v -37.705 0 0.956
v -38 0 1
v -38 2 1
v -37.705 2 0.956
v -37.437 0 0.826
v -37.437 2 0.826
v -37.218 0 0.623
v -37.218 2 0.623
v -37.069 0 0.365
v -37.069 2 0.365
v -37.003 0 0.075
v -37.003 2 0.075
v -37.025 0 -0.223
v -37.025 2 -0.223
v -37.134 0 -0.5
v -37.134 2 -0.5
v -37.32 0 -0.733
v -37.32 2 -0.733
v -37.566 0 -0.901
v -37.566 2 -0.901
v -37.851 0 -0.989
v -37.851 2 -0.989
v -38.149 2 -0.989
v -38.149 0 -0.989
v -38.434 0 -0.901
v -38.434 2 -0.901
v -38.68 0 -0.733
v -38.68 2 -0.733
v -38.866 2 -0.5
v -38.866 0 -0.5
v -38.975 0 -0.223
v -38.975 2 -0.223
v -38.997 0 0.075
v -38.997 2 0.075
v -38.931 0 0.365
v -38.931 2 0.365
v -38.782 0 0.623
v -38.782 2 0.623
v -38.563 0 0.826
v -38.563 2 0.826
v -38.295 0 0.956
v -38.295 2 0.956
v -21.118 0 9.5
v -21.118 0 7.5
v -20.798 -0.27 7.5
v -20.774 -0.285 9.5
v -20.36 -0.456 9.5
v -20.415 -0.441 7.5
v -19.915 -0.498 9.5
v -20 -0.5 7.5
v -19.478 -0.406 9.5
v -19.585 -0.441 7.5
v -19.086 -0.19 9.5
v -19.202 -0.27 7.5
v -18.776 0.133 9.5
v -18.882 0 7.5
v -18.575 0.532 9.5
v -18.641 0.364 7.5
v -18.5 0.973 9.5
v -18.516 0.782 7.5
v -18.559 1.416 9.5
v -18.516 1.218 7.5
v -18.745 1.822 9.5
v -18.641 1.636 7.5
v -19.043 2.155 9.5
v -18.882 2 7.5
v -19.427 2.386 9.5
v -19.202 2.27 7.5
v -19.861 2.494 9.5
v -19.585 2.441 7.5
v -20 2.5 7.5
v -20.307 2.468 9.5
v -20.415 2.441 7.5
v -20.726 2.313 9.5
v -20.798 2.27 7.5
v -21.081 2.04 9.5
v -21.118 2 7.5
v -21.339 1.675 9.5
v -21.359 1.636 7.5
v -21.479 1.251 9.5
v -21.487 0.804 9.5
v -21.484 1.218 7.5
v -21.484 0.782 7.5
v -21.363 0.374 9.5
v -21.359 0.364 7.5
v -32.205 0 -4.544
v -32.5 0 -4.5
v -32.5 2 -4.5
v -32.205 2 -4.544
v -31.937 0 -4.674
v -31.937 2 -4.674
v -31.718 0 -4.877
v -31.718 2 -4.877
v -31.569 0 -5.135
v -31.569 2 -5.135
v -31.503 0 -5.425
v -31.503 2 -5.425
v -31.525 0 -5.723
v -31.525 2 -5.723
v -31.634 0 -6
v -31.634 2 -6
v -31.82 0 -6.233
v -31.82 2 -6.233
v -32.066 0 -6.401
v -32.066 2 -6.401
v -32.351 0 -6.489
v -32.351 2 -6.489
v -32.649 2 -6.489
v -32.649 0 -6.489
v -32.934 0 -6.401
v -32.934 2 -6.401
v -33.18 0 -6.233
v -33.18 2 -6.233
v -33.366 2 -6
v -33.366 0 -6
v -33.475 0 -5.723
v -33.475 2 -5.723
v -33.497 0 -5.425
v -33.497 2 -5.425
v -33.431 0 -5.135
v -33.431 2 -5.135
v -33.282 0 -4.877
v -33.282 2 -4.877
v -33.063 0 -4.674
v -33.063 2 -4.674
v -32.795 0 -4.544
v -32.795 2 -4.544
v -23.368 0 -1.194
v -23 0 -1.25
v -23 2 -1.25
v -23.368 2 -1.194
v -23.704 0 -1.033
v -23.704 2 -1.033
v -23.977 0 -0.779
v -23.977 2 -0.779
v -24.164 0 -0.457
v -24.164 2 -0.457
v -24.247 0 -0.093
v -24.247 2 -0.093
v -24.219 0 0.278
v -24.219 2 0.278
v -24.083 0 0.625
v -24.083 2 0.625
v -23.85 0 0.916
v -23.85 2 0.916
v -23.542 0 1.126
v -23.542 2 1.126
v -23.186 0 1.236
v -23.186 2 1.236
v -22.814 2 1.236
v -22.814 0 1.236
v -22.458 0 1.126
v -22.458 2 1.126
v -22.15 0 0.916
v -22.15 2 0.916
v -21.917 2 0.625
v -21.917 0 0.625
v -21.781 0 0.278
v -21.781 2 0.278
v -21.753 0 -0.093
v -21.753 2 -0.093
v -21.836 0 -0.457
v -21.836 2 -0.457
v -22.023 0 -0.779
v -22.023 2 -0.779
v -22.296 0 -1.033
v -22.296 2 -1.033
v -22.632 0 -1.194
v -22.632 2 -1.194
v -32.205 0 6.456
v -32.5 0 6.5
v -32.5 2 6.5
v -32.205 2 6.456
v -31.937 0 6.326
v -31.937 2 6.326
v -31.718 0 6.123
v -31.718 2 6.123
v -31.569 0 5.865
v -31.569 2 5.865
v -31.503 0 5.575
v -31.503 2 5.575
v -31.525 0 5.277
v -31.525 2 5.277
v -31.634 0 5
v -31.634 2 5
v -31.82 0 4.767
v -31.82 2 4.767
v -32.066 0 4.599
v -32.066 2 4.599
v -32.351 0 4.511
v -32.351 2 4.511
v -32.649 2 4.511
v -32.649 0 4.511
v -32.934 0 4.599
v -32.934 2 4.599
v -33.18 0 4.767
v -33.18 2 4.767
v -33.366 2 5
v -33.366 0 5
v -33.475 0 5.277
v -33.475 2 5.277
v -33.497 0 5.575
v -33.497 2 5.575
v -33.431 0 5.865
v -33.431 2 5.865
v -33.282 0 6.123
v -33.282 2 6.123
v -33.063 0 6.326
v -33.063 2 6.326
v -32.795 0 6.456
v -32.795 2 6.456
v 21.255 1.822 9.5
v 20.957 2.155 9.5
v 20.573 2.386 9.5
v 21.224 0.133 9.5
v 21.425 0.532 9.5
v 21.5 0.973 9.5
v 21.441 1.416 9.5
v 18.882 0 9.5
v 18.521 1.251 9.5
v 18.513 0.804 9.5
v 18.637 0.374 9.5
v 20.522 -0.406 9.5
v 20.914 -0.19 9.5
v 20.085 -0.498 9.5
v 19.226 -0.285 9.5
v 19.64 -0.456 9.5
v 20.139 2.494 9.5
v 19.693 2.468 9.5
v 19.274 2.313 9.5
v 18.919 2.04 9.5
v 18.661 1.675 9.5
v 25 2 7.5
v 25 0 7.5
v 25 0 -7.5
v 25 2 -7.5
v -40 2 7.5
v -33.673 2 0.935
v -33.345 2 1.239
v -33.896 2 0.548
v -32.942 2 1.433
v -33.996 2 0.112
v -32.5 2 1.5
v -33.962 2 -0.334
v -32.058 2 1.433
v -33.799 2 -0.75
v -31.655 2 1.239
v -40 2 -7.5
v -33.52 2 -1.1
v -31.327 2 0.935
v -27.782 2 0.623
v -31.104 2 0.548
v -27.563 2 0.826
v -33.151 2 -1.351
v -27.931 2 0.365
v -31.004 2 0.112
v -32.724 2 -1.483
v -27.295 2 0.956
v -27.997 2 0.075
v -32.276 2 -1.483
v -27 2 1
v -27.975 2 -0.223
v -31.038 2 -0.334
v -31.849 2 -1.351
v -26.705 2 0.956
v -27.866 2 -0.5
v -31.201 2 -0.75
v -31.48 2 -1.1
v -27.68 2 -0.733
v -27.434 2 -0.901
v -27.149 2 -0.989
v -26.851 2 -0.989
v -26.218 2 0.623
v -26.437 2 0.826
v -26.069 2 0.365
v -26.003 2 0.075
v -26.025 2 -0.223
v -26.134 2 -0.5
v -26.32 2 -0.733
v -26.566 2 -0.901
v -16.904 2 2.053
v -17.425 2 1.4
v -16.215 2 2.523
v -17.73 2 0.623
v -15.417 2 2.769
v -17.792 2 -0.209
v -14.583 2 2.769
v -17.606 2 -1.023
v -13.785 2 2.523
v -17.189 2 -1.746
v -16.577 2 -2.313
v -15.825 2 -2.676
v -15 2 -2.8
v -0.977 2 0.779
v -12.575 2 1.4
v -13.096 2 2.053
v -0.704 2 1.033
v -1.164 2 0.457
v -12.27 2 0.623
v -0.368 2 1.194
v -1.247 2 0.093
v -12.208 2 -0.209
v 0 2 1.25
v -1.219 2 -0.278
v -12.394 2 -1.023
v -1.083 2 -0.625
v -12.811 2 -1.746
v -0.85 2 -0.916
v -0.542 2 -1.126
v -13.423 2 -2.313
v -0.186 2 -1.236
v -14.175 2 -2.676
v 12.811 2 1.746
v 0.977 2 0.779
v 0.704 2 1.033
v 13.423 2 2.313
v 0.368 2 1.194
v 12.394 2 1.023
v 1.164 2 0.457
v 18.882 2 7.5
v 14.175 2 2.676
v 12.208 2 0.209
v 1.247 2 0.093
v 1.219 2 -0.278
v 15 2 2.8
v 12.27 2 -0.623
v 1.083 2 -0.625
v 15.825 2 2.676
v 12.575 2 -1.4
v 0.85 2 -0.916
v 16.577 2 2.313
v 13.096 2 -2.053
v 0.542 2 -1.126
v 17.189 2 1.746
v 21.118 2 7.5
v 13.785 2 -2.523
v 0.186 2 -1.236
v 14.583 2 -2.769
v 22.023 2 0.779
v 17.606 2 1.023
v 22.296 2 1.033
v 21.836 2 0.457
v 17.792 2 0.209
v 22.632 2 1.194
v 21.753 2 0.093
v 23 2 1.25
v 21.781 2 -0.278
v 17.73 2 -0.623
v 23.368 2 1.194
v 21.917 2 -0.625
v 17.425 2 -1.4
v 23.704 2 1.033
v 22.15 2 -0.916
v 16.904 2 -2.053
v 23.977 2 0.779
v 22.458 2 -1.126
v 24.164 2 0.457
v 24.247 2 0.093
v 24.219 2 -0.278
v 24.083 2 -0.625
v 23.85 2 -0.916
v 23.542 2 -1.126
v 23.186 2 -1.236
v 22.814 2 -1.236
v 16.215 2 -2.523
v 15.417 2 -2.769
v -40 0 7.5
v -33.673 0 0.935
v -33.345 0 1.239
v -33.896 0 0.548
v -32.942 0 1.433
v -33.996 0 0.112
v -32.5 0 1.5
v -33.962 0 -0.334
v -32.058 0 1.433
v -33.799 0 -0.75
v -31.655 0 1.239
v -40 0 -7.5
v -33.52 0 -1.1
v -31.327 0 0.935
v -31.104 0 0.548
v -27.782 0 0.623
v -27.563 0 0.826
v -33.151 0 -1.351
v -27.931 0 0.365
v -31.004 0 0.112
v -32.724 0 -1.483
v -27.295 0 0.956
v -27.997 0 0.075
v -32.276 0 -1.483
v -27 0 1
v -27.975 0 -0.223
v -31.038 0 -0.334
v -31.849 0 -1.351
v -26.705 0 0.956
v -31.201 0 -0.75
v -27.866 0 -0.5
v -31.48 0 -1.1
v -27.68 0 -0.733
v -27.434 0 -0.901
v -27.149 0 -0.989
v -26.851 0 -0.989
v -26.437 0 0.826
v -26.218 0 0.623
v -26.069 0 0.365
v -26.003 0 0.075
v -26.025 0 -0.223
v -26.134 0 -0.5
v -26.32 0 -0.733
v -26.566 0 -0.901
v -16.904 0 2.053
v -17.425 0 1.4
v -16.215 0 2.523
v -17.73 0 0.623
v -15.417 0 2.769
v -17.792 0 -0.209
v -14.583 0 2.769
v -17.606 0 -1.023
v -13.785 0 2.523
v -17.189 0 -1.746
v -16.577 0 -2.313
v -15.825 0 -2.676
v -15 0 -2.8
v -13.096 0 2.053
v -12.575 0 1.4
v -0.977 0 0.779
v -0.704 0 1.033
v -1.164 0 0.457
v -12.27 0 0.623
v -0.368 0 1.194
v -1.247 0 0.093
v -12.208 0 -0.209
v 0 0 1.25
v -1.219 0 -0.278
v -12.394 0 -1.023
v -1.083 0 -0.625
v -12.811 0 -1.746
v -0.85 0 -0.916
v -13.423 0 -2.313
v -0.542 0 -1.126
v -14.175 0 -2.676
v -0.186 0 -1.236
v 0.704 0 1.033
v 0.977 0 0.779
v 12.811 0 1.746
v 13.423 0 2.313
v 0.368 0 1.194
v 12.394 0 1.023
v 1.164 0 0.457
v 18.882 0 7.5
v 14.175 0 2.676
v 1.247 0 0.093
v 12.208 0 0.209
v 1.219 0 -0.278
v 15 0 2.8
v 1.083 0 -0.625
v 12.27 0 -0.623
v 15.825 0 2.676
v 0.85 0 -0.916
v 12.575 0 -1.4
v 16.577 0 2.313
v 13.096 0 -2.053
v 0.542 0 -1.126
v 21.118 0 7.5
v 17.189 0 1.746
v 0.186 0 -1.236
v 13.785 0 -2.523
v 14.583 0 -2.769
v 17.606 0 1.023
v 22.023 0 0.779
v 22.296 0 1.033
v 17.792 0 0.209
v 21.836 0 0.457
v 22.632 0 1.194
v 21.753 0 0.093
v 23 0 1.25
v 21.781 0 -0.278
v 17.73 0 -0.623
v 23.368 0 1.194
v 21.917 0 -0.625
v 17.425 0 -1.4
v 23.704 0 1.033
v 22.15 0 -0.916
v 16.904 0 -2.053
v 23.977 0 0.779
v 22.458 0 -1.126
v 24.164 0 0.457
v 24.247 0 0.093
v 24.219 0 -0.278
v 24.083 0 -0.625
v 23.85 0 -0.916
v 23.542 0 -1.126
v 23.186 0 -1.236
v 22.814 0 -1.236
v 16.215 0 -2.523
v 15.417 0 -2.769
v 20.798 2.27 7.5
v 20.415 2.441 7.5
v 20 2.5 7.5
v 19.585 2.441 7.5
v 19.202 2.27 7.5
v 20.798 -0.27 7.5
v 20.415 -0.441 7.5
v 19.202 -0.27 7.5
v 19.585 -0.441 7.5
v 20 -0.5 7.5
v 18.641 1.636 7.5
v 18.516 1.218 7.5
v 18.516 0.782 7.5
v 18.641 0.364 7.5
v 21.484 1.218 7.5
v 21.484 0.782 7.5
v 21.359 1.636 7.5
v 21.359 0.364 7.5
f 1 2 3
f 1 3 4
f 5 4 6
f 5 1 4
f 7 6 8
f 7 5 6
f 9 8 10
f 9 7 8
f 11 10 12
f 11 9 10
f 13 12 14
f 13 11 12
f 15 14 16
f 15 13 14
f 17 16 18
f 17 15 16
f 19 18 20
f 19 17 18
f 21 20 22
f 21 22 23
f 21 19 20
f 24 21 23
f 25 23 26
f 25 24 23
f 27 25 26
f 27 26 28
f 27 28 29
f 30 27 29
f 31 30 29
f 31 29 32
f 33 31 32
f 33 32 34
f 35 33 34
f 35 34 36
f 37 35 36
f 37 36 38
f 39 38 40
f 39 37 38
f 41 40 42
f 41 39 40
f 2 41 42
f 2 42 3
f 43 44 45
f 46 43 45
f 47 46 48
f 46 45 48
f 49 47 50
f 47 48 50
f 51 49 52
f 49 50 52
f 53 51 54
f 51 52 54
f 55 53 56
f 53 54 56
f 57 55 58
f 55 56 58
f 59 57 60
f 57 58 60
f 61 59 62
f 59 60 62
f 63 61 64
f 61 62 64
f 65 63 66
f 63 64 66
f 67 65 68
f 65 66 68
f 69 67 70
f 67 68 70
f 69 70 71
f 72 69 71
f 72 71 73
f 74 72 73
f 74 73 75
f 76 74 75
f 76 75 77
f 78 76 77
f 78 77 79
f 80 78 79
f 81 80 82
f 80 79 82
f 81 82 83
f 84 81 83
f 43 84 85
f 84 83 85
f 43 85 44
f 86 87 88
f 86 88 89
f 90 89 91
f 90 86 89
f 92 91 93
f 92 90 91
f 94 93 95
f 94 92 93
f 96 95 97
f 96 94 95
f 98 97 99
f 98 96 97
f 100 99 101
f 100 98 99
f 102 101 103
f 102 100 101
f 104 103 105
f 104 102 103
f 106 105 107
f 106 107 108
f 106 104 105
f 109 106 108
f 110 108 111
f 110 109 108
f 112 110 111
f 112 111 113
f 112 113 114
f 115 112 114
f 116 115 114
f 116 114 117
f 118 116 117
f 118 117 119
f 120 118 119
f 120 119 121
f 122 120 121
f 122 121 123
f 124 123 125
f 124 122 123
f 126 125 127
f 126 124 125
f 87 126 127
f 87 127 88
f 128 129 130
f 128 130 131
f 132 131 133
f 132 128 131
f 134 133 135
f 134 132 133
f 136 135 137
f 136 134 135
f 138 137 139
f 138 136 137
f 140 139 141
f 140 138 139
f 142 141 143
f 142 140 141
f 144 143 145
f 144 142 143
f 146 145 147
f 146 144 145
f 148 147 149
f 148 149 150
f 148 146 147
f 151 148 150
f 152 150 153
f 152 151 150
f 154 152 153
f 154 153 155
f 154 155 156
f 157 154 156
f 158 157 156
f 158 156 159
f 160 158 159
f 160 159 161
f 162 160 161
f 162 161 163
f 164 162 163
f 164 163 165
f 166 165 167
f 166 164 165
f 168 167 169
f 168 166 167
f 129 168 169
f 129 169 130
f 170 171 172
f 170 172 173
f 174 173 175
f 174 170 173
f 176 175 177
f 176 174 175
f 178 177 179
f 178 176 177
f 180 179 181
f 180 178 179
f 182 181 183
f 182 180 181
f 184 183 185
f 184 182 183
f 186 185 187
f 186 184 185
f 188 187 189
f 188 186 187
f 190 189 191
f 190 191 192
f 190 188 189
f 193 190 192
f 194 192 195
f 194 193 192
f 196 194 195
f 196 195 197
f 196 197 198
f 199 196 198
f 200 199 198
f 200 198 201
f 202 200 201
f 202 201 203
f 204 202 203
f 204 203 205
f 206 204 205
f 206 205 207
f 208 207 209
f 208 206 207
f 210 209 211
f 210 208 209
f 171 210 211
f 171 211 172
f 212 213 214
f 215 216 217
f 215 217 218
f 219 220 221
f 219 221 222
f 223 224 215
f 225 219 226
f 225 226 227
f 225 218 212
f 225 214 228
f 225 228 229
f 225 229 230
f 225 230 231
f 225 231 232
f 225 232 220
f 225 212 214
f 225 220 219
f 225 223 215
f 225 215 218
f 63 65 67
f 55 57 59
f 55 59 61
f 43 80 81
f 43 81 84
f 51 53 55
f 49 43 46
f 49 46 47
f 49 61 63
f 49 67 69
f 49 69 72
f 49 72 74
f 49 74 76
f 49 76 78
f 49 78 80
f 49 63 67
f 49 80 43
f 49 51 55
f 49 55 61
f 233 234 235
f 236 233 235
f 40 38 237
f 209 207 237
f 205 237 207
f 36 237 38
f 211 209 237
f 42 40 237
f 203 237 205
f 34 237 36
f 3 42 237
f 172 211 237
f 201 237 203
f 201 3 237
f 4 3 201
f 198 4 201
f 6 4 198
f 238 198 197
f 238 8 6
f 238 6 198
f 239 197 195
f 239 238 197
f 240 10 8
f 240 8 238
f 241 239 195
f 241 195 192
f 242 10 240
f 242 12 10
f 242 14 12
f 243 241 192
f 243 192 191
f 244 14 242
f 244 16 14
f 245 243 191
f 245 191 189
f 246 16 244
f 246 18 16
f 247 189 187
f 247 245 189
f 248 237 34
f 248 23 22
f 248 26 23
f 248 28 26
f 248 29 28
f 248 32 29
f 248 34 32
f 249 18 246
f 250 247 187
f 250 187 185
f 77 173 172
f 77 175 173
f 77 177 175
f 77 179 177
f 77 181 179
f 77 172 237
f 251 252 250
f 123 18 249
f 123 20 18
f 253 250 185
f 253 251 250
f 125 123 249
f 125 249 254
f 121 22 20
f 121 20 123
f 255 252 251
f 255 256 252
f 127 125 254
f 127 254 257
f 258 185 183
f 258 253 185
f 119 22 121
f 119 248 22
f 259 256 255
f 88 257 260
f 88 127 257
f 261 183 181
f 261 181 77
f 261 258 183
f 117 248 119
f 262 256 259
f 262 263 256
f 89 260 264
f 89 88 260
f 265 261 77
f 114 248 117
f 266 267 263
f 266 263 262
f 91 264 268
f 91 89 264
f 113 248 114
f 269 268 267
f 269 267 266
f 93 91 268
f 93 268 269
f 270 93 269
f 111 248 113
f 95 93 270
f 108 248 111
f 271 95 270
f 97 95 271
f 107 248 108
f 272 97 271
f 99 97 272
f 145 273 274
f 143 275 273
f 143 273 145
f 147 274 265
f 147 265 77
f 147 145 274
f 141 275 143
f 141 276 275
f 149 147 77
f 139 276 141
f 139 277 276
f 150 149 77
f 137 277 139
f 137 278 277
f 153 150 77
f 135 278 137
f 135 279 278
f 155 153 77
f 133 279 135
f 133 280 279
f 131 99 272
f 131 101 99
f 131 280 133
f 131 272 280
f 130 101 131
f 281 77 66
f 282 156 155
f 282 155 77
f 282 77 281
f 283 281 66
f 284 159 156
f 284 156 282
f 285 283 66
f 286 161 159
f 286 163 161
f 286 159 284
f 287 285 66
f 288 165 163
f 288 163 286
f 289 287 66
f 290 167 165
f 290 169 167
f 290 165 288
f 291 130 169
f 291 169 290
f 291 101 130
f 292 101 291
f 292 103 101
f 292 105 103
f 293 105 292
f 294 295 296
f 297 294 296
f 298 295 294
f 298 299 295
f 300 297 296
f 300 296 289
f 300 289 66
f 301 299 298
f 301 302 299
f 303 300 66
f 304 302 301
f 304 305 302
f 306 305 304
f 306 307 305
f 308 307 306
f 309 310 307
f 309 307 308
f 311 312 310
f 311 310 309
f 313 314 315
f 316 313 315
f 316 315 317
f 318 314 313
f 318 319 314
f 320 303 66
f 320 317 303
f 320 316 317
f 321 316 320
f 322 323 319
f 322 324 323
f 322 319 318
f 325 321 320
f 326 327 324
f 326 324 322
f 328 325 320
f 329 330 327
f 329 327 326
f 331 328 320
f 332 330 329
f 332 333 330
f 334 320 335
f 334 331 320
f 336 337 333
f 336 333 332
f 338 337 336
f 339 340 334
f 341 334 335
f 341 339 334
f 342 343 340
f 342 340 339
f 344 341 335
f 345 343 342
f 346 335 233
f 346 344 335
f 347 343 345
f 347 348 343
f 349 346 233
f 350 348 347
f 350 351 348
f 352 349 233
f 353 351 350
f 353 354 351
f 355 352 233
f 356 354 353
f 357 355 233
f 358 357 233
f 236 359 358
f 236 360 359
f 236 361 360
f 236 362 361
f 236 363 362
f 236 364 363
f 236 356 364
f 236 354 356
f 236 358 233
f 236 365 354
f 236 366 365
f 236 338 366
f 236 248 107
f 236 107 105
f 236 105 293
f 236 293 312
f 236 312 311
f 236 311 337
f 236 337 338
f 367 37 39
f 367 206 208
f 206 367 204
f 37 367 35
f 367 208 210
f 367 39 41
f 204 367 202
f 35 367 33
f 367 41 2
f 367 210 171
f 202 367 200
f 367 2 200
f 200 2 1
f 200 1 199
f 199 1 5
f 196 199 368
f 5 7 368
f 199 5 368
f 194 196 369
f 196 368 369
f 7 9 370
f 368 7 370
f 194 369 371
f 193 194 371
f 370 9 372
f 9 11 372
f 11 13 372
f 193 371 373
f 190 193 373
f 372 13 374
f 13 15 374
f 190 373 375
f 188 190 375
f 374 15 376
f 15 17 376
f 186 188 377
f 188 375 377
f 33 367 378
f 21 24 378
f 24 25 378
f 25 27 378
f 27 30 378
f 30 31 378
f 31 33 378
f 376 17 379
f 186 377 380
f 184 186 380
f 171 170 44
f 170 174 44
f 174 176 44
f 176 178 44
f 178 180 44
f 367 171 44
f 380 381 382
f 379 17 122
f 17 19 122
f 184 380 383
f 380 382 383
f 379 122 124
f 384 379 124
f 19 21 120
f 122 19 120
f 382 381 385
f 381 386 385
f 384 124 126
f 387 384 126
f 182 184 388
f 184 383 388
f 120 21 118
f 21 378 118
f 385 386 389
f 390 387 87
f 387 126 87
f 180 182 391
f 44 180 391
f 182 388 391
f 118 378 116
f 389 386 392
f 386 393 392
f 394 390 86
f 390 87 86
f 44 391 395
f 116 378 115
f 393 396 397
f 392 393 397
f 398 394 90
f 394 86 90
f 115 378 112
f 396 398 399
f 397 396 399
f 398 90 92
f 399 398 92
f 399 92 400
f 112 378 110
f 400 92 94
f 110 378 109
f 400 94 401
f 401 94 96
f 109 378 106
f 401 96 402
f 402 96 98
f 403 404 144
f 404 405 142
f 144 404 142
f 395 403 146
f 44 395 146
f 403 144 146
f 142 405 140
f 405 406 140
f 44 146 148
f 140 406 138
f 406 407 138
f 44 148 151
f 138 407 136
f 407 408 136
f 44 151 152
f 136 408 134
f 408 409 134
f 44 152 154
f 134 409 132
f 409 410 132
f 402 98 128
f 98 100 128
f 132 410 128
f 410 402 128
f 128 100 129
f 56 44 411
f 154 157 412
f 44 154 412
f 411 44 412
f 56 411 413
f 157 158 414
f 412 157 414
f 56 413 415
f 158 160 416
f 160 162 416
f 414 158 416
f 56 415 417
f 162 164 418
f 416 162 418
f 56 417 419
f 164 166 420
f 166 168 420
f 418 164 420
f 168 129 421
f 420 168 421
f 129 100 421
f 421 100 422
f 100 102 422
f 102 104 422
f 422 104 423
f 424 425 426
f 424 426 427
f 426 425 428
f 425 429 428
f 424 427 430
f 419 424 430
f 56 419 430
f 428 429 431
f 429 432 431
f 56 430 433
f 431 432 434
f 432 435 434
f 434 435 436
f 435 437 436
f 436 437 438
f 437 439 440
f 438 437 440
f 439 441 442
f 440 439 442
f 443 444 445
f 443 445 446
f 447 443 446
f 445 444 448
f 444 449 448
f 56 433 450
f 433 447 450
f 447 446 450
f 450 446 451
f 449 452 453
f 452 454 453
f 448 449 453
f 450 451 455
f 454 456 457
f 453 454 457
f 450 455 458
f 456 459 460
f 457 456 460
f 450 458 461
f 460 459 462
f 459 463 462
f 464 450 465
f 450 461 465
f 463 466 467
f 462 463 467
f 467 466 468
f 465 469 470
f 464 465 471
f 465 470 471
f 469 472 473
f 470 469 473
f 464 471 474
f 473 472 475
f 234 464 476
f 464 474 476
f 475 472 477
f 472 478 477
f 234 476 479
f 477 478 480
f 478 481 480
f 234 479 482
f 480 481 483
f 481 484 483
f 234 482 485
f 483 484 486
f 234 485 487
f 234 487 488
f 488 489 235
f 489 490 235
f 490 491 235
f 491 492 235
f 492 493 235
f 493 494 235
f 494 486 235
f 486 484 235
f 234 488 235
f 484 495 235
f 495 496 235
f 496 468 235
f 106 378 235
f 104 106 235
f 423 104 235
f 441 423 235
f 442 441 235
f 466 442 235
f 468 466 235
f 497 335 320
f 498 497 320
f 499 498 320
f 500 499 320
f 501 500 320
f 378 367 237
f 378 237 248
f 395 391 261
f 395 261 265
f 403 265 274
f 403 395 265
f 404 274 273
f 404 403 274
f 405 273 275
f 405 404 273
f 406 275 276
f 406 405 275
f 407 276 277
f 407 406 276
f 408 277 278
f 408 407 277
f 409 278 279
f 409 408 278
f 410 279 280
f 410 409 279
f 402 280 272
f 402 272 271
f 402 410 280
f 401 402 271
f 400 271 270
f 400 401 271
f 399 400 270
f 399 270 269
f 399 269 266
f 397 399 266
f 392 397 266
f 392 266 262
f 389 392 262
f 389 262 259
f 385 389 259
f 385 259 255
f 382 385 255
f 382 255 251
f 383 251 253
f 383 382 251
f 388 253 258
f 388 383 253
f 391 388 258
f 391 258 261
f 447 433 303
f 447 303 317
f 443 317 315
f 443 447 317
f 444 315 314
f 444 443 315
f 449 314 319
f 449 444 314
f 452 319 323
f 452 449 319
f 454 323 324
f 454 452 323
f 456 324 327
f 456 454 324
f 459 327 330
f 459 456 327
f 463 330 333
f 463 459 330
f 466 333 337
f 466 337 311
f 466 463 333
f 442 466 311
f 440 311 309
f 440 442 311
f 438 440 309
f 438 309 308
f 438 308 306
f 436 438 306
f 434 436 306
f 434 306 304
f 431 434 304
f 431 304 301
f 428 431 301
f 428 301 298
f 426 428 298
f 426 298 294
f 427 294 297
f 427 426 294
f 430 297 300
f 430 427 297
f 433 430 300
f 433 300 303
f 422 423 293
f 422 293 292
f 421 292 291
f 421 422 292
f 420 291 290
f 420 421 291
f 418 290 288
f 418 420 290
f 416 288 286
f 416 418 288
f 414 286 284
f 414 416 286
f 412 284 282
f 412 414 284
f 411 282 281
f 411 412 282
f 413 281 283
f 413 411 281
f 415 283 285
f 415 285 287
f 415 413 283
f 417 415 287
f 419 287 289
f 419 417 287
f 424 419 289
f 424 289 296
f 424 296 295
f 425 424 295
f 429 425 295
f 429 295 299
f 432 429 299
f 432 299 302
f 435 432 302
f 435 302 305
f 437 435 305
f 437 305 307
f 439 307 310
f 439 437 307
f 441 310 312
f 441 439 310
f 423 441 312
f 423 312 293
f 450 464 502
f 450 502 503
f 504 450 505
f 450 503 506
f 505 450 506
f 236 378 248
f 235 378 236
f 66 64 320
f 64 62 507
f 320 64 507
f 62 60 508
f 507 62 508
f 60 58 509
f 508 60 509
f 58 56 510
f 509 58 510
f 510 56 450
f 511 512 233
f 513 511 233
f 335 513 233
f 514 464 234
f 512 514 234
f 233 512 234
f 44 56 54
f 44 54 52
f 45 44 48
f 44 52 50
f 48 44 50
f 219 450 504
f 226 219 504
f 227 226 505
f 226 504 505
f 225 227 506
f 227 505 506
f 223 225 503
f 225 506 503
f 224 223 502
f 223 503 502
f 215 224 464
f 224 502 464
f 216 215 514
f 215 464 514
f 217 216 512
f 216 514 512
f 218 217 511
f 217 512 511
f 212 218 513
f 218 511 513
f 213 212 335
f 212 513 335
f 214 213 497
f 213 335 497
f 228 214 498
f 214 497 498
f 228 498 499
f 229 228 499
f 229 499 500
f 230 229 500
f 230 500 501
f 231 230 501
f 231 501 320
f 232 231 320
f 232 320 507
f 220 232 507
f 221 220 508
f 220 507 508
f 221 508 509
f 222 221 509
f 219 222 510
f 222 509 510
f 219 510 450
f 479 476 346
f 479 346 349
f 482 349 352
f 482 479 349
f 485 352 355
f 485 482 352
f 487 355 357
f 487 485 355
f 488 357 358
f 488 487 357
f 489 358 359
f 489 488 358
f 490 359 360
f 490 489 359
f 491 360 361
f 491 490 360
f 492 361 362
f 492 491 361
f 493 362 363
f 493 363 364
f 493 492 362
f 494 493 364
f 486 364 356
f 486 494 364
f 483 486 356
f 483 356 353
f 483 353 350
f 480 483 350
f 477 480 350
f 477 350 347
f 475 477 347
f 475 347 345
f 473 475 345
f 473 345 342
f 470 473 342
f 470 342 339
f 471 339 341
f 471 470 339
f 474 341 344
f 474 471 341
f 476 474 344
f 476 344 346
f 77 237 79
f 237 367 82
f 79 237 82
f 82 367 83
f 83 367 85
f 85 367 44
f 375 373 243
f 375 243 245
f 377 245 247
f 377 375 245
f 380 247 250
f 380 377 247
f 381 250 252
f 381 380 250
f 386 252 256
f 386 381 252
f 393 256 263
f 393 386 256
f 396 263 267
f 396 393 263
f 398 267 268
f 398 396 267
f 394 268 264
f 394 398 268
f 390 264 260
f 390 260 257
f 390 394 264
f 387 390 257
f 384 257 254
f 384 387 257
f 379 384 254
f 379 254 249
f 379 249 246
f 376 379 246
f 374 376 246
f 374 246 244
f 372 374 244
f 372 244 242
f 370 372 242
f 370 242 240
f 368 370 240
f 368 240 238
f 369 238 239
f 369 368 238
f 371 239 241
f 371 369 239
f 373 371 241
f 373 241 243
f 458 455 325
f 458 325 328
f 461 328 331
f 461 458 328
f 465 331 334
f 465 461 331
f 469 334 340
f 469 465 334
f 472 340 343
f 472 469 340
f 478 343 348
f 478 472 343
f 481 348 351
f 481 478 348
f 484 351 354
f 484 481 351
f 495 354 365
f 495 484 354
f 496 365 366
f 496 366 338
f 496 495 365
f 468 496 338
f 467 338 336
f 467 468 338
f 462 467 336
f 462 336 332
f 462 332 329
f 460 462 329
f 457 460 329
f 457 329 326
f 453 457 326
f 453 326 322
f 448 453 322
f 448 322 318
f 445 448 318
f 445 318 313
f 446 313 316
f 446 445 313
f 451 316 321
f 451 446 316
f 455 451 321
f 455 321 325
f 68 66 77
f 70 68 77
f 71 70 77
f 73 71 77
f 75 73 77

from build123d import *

# Parameters (mm, degrees)
SKETCH_1_W          = 65
SKETCH_1_H          = 15
EXTRUDE_1_DEPTH     = 2
SKETCH_2_R          = 1.25
SKETCH_2_R_2        = 2.8
SKETCH_2_R_3        = 1.5
SKETCH_2_R_4        = 1
CUT_EXTRUDE_1_DEPTH = 2
SKETCH_4_R          = 1.5
EXTRUDE_2_DEPTH     = 2


with BuildPart() as part:
    # 草图1 → 凸台-拉伸1 (new body)
    with BuildSketch(Plane(origin=(0, 0, 0), x_dir=(1, 0, 0), z_dir=(0, 1, 0))):
        with Locations((-7.5, 0)):
            Rectangle(SKETCH_1_W, SKETCH_1_H)
    extrude(amount=EXTRUDE_1_DEPTH)

    # 草图2 → 切除-拉伸1 (cut)
    with BuildSketch(Plane(origin=(0, 0, 0), x_dir=(1, 0, 0), z_dir=(0, 1, 0))):
        with Locations(Location((0, 0, 0), (0, 0, 270))):
            Circle(SKETCH_2_R)
        with Locations(Location((15, 0, 0), (0, 0, 270))):
            Circle(SKETCH_2_R_2)
        with Locations(Location((-15, 0, 0), (0, 0, 90))):
            Circle(SKETCH_2_R_2)
        with Locations(Location((23, 0, 0), (0, 0, 270))):
            Circle(SKETCH_2_R)
        with Locations(Location((-23, 0, 0), (0, 0, 90))):
            Circle(SKETCH_2_R)
        with Locations(Location((-32.5, 0, 0), (0, 0, 270))):
            Circle(SKETCH_2_R_3)
        with Locations(Location((-27, 0, 0), (0, 0, 270))):
            Circle(SKETCH_2_R_4)
        with Locations(Location((-32.5, -5.5, 0), (0, 0, 270))):
            Circle(SKETCH_2_R_4)
        with Locations(Location((-38, 0, 0), (0, 0, 270))):
            Circle(SKETCH_2_R_4)
        with Locations(Location((-32.5, 5.5, 0), (0, 0, 270))):
            Circle(SKETCH_2_R_4)
    extrude(amount=CUT_EXTRUDE_1_DEPTH, mode=Mode.SUBTRACT)

    # 草图4 → 凸台-拉伸2 (add)
    with BuildSketch(Plane.XY.offset(7.5)):
        with Locations(Location((20, 1, 0), (0, 0, 221.810314896))):
            Circle(SKETCH_4_R)
        with Locations(Location((-20, 1, 0), (0, 0, 221.810314896))):
            Circle(SKETCH_4_R)
    extrude(amount=EXTRUDE_2_DEPTH)


solid = part.part
